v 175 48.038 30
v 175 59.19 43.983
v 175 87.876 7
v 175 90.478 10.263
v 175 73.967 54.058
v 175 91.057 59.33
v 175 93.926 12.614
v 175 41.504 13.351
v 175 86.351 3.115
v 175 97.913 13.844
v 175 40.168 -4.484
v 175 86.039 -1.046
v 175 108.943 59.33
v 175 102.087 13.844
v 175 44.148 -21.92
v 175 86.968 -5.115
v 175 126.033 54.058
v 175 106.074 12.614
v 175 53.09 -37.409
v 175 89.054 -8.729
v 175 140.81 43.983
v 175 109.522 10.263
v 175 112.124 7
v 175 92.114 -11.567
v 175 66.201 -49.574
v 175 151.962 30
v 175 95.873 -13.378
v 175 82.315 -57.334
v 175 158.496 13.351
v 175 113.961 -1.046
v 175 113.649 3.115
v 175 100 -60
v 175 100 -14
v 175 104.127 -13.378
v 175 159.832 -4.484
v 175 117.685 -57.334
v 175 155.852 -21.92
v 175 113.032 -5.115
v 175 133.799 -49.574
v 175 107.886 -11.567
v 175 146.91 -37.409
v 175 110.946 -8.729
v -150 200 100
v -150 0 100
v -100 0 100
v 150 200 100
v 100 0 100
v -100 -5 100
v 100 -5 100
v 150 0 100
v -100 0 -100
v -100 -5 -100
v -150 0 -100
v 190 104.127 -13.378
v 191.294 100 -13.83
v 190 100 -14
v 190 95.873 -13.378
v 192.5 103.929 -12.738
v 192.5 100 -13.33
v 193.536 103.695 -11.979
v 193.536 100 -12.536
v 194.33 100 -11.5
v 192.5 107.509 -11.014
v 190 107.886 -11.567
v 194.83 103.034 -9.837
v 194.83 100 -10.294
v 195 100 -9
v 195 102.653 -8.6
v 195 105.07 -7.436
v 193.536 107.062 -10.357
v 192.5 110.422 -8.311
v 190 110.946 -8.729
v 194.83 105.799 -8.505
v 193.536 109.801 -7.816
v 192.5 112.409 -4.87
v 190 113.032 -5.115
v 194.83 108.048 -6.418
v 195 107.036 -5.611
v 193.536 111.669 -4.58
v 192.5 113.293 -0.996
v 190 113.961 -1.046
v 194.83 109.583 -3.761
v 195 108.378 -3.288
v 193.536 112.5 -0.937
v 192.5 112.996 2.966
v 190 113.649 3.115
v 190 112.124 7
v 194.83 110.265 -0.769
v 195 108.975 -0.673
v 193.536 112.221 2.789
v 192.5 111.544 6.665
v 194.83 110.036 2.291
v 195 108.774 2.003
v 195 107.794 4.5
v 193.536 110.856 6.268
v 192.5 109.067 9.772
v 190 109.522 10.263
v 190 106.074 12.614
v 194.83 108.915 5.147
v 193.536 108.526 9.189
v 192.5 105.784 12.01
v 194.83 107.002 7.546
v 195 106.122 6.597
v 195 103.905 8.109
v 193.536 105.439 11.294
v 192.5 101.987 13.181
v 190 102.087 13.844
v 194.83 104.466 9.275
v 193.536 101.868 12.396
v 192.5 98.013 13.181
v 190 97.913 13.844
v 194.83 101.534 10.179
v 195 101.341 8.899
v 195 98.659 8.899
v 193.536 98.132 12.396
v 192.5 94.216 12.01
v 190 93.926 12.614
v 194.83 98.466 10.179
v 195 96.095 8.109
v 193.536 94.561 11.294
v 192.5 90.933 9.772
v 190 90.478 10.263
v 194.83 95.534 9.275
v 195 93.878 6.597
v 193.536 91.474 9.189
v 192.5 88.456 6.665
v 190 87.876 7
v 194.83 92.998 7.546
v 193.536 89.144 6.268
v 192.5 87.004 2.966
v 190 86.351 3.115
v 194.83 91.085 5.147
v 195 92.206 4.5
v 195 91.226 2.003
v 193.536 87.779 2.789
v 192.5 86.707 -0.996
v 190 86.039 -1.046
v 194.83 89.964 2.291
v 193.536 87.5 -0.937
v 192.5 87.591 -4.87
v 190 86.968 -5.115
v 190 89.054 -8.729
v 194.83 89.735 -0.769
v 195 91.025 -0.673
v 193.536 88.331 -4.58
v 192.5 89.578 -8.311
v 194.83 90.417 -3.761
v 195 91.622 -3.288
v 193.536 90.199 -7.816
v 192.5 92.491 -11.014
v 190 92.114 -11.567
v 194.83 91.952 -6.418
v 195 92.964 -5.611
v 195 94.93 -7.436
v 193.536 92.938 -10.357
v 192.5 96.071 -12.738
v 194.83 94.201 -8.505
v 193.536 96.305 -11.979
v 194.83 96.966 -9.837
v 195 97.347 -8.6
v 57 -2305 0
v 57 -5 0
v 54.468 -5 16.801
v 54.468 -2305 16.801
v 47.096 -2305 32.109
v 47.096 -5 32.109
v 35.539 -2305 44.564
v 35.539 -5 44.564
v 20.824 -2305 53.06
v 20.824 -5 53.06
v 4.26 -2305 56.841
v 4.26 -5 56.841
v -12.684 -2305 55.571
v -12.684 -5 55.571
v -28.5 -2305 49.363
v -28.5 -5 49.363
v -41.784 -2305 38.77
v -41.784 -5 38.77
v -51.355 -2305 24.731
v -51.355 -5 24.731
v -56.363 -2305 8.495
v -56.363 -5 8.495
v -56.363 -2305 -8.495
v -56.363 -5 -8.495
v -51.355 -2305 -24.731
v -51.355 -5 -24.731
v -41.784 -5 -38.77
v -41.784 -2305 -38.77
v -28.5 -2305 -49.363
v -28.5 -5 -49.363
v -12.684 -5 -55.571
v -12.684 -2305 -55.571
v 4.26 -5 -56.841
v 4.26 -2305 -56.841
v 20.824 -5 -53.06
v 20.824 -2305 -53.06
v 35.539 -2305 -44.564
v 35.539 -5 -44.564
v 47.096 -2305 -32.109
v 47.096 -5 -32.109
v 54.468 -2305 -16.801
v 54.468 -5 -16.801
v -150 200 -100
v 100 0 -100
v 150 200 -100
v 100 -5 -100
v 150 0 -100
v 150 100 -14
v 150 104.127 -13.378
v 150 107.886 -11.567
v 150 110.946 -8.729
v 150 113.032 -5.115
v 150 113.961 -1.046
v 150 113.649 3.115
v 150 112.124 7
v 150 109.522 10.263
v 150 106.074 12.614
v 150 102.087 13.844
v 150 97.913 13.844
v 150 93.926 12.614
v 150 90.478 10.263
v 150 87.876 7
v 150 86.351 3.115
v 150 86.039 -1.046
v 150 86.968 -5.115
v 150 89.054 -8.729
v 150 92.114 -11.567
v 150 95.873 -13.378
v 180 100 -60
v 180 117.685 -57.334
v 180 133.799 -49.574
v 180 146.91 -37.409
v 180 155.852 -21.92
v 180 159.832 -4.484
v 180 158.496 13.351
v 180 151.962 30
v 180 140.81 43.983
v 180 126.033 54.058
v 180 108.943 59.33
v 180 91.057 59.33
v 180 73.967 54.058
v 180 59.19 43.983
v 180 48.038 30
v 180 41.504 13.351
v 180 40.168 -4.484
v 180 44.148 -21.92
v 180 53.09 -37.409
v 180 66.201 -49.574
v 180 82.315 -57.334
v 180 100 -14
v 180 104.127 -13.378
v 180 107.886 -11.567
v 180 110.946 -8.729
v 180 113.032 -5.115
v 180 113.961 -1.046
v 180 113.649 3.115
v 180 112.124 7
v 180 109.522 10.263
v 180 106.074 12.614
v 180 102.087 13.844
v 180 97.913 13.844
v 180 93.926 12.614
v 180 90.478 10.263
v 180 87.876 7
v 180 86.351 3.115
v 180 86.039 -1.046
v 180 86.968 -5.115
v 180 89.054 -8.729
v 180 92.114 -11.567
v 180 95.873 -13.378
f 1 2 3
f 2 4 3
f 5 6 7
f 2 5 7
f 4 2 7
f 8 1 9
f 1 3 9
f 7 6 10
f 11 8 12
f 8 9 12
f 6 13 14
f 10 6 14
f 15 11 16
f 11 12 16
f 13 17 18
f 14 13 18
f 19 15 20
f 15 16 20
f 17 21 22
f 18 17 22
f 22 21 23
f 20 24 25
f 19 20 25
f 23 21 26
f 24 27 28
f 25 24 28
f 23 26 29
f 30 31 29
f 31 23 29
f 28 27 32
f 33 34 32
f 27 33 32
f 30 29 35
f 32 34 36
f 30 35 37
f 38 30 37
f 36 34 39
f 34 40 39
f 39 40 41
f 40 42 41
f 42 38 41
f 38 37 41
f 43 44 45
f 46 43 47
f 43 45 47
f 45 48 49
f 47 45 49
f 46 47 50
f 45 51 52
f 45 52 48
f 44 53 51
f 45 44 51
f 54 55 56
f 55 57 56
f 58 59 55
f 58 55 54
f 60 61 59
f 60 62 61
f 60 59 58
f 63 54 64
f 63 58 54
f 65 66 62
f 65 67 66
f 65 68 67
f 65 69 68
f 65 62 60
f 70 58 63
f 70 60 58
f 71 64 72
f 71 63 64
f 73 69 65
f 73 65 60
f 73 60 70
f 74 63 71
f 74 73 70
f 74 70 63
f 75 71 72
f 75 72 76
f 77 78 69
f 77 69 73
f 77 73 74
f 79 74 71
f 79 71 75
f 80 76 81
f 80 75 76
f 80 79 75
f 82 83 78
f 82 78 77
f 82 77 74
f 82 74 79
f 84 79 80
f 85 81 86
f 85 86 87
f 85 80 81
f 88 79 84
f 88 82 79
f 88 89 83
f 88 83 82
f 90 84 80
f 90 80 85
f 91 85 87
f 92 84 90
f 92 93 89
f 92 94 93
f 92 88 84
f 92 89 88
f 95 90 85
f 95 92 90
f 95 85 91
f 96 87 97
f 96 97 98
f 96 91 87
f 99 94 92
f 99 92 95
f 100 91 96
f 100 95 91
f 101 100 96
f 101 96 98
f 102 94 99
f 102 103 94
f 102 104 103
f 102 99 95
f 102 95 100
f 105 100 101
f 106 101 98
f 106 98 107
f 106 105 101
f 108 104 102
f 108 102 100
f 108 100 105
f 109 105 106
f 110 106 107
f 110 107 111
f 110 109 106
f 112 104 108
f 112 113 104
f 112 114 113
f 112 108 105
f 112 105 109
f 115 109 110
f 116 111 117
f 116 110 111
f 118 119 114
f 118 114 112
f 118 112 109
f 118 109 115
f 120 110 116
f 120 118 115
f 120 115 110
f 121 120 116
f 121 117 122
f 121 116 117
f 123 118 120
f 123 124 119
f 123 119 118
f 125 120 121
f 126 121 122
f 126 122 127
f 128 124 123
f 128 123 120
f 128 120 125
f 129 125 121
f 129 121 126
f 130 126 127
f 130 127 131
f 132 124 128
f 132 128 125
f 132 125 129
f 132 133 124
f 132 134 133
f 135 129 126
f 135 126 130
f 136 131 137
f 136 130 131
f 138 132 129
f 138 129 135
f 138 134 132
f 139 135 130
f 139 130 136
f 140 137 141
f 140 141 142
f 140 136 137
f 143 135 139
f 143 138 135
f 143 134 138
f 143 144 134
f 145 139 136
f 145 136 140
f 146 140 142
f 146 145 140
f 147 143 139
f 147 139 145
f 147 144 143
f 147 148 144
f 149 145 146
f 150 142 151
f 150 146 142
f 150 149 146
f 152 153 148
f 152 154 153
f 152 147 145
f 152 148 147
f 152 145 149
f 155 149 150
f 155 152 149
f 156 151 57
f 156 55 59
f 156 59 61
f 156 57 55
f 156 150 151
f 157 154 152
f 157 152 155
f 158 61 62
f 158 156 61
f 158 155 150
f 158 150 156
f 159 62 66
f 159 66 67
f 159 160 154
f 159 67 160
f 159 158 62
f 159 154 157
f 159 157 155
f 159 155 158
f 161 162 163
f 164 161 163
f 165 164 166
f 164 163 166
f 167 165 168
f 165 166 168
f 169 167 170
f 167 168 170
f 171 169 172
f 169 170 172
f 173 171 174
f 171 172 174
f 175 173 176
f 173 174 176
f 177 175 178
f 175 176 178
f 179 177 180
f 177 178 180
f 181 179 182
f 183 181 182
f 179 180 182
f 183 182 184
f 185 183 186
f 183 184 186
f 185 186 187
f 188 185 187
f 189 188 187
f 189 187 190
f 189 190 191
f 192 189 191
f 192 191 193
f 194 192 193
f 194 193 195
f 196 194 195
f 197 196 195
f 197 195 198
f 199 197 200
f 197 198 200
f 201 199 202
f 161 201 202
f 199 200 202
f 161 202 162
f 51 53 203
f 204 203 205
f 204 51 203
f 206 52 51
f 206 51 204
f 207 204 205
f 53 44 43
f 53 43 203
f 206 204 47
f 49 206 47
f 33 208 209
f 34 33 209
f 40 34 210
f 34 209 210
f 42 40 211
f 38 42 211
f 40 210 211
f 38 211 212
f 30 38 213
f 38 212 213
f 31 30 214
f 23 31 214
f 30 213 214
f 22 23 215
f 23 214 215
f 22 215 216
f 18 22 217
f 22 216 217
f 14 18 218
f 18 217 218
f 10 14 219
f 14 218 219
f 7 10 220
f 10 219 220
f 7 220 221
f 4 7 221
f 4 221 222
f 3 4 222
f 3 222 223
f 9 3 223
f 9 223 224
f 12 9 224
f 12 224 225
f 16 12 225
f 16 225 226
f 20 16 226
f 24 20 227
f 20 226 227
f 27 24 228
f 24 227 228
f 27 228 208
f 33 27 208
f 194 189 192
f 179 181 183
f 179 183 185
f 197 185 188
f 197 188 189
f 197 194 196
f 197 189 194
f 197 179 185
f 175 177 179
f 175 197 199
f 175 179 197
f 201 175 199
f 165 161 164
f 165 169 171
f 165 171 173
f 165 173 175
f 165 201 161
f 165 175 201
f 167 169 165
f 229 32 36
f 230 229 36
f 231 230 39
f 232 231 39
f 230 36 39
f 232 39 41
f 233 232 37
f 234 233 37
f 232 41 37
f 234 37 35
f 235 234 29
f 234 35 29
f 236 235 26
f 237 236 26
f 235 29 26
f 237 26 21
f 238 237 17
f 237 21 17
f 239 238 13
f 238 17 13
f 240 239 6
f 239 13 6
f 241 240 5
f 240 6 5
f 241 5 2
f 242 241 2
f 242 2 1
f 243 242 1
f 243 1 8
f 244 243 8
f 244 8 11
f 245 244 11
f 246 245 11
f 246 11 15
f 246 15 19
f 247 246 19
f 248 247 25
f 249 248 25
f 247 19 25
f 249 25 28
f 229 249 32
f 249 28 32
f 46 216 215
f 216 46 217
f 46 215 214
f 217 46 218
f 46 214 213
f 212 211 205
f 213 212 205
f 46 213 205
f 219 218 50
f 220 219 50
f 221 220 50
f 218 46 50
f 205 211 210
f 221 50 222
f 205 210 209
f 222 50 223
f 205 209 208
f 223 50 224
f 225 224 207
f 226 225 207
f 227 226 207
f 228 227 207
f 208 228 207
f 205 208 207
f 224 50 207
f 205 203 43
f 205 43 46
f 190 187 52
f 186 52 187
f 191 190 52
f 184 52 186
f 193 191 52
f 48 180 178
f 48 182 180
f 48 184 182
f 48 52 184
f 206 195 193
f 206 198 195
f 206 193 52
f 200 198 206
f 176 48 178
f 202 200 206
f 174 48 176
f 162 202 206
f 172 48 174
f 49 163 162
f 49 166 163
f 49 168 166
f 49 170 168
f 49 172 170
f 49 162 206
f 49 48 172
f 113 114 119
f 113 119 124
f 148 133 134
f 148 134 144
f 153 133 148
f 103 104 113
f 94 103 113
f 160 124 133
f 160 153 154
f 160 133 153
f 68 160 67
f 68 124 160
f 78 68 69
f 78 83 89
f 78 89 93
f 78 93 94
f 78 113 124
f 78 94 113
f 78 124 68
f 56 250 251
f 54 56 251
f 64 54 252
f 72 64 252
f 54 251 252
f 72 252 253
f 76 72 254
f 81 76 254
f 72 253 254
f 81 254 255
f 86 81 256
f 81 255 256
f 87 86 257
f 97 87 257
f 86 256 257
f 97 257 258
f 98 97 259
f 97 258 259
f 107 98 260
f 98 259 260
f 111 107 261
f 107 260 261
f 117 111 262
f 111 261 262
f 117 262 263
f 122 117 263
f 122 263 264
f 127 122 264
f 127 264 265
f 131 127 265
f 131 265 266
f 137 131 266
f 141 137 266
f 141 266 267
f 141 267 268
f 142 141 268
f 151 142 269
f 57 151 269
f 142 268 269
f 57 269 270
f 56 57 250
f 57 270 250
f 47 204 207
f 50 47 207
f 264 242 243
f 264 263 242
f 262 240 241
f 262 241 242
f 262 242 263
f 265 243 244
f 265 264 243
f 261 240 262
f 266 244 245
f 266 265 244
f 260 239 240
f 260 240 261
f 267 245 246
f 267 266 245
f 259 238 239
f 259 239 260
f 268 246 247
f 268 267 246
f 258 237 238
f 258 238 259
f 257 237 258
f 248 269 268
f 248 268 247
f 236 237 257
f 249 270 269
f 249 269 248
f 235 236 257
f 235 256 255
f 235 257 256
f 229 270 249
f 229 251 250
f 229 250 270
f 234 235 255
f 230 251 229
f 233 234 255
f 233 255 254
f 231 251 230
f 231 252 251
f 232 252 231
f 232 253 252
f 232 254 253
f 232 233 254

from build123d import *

# Parameters (mm, degrees)
SKETCH1_W           = 300
SKETCH1_H           = 200
BOSS_EXTRUDE1_DEPTH = 200
SKETCH2_R           = 14
BOSS_EXTRUDE2_DEPTH = 25
SKETCH3_R           = 60
BOSS_EXTRUDE3_DEPTH = 5
SKETCH4_R           = 14
BOSS_EXTRUDE4_DEPTH = 15
FILLET1_R           = 5
SKETCH5_W           = 200
SKETCH5_H           = 200
BOSS_EXTRUDE5_DEPTH = 5
SKETCH6_R           = 57
BOSS_EXTRUDE6_DEPTH = 2300


with BuildPart() as part:
    # Sketch1 → Boss-Extrude1 (new body)
    with BuildSketch(Plane(origin=(0, 0, 0), x_dir=(1, 0, 0), z_dir=(0, 1, 0))):
        Rectangle(SKETCH1_W, SKETCH1_H)
    extrude(amount=BOSS_EXTRUDE1_DEPTH)

    # Sketch2 → Boss-Extrude2 (add)
    with BuildSketch(Plane(origin=(150, 0, 0), x_dir=(0, 0, -1), z_dir=(1, 0, 0))):
        with Locations((0, 100)):
            Circle(SKETCH2_R)
    extrude(amount=BOSS_EXTRUDE2_DEPTH)

    # Sketch3 → Boss-Extrude3 (add)
    with BuildSketch(Plane(origin=(175, 0, 0), x_dir=(0, 0, -1), z_dir=(1, 0, 0))):
        with Locations((0, 100)):
            Circle(SKETCH3_R)
    extrude(amount=BOSS_EXTRUDE3_DEPTH)

    # Sketch4 → Boss-Extrude4 (add)
    with BuildSketch(Plane(origin=(180, 0, 0), x_dir=(0, 0, -1), z_dir=(1, 0, 0))):
        with Locations((0, 100)):
            Circle(SKETCH4_R)
    extrude(amount=BOSS_EXTRUDE4_DEPTH)

    # Fillet1
    fillet1_edges = [part.edges().sort_by_distance(p)[0] for p in [
        (195, 100, 14),
    ]]
    fillet(fillet1_edges, radius=FILLET1_R)

    # Sketch5 → Boss-Extrude5 (add)
    with BuildSketch(Plane.XZ):
        Rectangle(SKETCH5_W, SKETCH5_H)
    extrude(amount=BOSS_EXTRUDE5_DEPTH)

    # Sketch6 → Boss-Extrude6 (add)
    with BuildSketch(Plane.XZ.offset(5)):
        Circle(SKETCH6_R)
    extrude(amount=BOSS_EXTRUDE6_DEPTH)


solid = part.part
